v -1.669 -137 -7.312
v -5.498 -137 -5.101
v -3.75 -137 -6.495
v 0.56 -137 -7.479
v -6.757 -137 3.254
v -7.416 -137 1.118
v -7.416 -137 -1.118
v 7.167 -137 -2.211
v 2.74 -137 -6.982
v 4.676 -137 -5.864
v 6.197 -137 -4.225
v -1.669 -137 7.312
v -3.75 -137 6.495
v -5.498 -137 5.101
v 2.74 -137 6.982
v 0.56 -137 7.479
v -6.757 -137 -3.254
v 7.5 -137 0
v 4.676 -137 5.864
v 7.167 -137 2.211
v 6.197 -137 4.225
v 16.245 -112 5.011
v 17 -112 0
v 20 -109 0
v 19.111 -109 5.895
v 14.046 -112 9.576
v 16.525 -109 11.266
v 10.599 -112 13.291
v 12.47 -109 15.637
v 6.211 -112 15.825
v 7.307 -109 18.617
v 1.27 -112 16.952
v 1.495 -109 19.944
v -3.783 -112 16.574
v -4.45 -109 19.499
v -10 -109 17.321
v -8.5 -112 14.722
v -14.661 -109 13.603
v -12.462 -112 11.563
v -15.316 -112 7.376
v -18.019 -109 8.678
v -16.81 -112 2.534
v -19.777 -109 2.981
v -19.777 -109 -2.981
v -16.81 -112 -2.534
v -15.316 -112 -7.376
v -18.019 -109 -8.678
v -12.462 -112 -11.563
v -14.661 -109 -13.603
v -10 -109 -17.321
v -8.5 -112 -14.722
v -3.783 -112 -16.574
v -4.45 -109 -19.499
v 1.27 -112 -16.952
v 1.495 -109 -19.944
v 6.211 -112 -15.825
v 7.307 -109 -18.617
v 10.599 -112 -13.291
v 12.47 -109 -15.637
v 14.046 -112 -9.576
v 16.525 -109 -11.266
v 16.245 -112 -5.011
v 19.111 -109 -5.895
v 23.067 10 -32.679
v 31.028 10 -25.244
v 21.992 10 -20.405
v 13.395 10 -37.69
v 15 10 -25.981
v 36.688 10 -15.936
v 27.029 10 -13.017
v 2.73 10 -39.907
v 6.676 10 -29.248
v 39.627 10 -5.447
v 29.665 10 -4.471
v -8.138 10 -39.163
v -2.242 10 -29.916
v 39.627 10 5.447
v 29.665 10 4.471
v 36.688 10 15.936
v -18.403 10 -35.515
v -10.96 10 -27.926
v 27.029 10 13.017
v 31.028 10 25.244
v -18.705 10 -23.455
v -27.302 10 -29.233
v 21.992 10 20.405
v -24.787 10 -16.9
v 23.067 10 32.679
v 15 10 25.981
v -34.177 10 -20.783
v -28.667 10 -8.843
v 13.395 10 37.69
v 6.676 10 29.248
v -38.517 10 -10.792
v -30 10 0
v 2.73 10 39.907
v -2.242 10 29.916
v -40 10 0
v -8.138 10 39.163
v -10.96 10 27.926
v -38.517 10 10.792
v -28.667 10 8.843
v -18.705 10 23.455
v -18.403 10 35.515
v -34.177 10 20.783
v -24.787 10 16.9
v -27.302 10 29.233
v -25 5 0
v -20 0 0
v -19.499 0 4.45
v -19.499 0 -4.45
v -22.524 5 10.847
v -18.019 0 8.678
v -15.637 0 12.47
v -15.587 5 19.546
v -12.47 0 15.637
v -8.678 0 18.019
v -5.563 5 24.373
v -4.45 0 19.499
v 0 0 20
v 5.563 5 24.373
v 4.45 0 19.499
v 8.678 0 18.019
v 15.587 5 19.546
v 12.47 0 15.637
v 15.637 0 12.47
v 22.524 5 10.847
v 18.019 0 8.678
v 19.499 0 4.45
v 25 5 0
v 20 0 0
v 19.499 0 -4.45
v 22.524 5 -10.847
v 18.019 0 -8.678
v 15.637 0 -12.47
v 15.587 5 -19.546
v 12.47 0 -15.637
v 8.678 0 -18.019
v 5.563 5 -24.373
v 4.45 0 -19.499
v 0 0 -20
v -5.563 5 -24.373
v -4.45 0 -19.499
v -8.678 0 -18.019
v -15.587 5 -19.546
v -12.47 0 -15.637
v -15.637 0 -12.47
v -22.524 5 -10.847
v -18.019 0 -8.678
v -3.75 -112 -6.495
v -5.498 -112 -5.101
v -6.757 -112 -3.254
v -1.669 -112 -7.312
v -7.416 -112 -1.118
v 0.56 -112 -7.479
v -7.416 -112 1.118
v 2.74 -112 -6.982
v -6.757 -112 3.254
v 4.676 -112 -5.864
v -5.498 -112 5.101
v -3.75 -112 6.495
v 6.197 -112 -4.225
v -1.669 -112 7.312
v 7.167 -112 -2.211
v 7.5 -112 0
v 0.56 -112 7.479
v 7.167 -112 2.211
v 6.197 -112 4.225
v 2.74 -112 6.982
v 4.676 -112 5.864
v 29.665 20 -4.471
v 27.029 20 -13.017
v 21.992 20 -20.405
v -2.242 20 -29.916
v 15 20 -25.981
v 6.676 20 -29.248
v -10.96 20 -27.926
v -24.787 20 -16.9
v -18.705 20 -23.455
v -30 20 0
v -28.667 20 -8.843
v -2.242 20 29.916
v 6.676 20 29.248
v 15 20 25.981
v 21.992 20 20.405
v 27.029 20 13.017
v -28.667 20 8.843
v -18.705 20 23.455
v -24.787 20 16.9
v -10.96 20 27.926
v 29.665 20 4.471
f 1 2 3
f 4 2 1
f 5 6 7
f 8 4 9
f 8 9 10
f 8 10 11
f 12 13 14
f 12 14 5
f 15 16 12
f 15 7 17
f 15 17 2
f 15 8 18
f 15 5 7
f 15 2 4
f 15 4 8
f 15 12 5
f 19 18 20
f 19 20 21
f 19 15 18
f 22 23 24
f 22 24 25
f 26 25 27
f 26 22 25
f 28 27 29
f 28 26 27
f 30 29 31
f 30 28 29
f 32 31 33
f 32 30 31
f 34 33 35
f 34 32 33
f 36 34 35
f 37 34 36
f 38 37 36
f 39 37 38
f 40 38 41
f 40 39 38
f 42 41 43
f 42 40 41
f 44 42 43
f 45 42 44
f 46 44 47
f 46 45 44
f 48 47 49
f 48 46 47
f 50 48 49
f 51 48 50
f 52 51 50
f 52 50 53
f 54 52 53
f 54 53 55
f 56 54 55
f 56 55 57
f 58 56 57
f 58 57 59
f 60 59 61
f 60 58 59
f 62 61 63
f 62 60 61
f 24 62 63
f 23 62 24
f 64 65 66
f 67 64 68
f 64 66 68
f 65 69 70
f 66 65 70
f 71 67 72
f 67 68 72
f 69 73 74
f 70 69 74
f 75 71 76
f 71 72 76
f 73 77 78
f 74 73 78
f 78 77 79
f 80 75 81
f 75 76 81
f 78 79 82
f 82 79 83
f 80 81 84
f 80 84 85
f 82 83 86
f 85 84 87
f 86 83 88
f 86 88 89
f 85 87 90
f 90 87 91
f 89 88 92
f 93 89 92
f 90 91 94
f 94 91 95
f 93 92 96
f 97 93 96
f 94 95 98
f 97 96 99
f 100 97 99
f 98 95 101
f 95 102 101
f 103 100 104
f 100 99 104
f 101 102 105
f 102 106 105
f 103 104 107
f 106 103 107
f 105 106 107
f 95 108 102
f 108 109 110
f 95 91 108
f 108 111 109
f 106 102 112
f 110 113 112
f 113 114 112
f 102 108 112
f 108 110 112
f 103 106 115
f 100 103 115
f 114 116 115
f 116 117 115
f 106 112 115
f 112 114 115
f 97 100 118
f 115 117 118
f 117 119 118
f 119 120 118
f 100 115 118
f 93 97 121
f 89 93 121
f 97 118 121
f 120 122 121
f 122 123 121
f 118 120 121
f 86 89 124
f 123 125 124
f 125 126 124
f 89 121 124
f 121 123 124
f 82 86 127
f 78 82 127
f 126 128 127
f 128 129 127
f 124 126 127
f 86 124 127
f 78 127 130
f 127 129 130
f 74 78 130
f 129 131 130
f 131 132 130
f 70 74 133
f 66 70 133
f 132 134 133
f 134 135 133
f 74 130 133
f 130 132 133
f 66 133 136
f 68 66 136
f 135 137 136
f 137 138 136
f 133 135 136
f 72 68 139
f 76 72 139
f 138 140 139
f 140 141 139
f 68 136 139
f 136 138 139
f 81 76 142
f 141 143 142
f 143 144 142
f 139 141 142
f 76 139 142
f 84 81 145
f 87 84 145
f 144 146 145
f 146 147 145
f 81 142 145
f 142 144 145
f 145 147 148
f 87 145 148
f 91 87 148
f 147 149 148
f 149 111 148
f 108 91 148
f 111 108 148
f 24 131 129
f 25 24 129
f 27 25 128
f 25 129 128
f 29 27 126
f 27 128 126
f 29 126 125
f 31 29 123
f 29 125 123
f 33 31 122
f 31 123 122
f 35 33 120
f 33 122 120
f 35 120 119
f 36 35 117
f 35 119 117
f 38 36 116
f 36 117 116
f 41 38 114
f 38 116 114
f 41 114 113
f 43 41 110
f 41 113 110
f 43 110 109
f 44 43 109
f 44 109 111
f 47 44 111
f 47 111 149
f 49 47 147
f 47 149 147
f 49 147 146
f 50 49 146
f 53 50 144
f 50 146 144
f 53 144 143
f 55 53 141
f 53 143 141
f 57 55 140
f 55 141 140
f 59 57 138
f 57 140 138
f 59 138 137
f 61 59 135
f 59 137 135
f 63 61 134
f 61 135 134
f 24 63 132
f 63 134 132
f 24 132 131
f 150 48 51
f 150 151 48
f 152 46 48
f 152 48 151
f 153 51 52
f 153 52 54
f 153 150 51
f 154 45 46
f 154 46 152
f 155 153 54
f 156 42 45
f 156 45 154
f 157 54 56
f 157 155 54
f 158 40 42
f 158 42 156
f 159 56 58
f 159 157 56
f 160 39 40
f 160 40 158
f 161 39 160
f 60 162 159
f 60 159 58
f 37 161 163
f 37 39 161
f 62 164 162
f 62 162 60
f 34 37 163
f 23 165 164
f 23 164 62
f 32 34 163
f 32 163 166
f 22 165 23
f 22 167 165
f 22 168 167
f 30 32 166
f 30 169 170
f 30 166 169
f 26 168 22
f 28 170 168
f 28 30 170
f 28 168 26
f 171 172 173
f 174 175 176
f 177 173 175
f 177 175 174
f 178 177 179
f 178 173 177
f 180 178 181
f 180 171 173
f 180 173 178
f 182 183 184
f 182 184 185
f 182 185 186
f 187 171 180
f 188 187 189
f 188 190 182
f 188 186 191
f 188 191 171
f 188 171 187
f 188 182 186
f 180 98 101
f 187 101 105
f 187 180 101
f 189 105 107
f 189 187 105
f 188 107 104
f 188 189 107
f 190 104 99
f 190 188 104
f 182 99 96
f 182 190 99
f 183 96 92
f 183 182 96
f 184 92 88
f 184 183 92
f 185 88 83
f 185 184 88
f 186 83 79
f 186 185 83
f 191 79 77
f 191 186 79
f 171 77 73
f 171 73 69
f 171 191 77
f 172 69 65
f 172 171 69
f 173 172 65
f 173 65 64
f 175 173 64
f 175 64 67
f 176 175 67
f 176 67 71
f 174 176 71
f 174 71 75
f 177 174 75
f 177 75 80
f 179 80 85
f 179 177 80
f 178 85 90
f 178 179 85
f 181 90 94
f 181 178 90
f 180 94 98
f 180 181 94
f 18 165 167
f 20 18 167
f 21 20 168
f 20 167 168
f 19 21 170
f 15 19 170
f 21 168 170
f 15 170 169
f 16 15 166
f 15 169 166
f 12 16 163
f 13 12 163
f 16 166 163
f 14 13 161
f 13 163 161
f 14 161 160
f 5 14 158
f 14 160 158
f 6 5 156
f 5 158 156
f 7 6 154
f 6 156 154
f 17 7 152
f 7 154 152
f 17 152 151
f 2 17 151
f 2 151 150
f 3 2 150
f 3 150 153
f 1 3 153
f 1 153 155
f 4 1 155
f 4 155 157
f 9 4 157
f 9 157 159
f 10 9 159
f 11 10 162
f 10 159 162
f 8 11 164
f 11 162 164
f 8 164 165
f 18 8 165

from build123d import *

# Parameters (mm, degrees)
F0_R     = 20
F1_DEPTH = 112
F2_SIZE  = 3
F3_R     = 7.5
F4_DEPTH = 25
F5_R     = 30
F6_DEPTH = 10
F7_SIZE  = 9.99999
F8_R     = 40
F9_DEPTH = 10
F10_SIZE = 9.99999


# Not quite as in the source:
# - a fillet or chamfer is up to 0.001 mm smaller than in the source, because OpenCascade refuses the exact size


with BuildPart() as f1:
    # F0 (on Front) → F1 (new body)
    with BuildSketch(Plane.XZ):
        Circle(F0_R)
    extrude(amount=F1_DEPTH)

    # F2
    f2_edges = [f1.edges().sort_by_distance(p)[0] for p in [
        (-20, -112, 0),
    ]]
    chamfer(f2_edges, length=F2_SIZE)

    # F3 (on face) → F4 (join)
    with BuildSketch(Plane.XZ.offset(112)):
        Circle(F3_R)
    extrude(amount=F4_DEPTH)

    # F5 (on face) → F6 (join)
    with BuildSketch(Plane(origin=(0, 0, 0), x_dir=(-1, 0, 0), z_dir=(0, 1, 0))):
        Circle(F5_R)
    extrude(amount=F6_DEPTH)

    # F7 (size 10 in the source; OpenCascade refuses exactly that, so slightly less here)
    f7_edges = [f1.edges().sort_by_distance(p)[0] for p in [
        (30, 0, 0),
    ]]
    chamfer(f7_edges, length=F7_SIZE)

    # F8 (on face) → F9 (join)
    with BuildSketch(Plane(origin=(0, 10, 0), x_dir=(-1, 0, 0), z_dir=(0, 1, 0))):
        Circle(F8_R)
    extrude(amount=F9_DEPTH)

    # F10 (size 10 in the source; OpenCascade refuses exactly that, so slightly less here)
    f10_edges = [f1.edges().sort_by_distance(p)[0] for p in [
        (40, 20, 0),
    ]]
    chamfer(f10_edges, length=F10_SIZE)


solid = f1.part
